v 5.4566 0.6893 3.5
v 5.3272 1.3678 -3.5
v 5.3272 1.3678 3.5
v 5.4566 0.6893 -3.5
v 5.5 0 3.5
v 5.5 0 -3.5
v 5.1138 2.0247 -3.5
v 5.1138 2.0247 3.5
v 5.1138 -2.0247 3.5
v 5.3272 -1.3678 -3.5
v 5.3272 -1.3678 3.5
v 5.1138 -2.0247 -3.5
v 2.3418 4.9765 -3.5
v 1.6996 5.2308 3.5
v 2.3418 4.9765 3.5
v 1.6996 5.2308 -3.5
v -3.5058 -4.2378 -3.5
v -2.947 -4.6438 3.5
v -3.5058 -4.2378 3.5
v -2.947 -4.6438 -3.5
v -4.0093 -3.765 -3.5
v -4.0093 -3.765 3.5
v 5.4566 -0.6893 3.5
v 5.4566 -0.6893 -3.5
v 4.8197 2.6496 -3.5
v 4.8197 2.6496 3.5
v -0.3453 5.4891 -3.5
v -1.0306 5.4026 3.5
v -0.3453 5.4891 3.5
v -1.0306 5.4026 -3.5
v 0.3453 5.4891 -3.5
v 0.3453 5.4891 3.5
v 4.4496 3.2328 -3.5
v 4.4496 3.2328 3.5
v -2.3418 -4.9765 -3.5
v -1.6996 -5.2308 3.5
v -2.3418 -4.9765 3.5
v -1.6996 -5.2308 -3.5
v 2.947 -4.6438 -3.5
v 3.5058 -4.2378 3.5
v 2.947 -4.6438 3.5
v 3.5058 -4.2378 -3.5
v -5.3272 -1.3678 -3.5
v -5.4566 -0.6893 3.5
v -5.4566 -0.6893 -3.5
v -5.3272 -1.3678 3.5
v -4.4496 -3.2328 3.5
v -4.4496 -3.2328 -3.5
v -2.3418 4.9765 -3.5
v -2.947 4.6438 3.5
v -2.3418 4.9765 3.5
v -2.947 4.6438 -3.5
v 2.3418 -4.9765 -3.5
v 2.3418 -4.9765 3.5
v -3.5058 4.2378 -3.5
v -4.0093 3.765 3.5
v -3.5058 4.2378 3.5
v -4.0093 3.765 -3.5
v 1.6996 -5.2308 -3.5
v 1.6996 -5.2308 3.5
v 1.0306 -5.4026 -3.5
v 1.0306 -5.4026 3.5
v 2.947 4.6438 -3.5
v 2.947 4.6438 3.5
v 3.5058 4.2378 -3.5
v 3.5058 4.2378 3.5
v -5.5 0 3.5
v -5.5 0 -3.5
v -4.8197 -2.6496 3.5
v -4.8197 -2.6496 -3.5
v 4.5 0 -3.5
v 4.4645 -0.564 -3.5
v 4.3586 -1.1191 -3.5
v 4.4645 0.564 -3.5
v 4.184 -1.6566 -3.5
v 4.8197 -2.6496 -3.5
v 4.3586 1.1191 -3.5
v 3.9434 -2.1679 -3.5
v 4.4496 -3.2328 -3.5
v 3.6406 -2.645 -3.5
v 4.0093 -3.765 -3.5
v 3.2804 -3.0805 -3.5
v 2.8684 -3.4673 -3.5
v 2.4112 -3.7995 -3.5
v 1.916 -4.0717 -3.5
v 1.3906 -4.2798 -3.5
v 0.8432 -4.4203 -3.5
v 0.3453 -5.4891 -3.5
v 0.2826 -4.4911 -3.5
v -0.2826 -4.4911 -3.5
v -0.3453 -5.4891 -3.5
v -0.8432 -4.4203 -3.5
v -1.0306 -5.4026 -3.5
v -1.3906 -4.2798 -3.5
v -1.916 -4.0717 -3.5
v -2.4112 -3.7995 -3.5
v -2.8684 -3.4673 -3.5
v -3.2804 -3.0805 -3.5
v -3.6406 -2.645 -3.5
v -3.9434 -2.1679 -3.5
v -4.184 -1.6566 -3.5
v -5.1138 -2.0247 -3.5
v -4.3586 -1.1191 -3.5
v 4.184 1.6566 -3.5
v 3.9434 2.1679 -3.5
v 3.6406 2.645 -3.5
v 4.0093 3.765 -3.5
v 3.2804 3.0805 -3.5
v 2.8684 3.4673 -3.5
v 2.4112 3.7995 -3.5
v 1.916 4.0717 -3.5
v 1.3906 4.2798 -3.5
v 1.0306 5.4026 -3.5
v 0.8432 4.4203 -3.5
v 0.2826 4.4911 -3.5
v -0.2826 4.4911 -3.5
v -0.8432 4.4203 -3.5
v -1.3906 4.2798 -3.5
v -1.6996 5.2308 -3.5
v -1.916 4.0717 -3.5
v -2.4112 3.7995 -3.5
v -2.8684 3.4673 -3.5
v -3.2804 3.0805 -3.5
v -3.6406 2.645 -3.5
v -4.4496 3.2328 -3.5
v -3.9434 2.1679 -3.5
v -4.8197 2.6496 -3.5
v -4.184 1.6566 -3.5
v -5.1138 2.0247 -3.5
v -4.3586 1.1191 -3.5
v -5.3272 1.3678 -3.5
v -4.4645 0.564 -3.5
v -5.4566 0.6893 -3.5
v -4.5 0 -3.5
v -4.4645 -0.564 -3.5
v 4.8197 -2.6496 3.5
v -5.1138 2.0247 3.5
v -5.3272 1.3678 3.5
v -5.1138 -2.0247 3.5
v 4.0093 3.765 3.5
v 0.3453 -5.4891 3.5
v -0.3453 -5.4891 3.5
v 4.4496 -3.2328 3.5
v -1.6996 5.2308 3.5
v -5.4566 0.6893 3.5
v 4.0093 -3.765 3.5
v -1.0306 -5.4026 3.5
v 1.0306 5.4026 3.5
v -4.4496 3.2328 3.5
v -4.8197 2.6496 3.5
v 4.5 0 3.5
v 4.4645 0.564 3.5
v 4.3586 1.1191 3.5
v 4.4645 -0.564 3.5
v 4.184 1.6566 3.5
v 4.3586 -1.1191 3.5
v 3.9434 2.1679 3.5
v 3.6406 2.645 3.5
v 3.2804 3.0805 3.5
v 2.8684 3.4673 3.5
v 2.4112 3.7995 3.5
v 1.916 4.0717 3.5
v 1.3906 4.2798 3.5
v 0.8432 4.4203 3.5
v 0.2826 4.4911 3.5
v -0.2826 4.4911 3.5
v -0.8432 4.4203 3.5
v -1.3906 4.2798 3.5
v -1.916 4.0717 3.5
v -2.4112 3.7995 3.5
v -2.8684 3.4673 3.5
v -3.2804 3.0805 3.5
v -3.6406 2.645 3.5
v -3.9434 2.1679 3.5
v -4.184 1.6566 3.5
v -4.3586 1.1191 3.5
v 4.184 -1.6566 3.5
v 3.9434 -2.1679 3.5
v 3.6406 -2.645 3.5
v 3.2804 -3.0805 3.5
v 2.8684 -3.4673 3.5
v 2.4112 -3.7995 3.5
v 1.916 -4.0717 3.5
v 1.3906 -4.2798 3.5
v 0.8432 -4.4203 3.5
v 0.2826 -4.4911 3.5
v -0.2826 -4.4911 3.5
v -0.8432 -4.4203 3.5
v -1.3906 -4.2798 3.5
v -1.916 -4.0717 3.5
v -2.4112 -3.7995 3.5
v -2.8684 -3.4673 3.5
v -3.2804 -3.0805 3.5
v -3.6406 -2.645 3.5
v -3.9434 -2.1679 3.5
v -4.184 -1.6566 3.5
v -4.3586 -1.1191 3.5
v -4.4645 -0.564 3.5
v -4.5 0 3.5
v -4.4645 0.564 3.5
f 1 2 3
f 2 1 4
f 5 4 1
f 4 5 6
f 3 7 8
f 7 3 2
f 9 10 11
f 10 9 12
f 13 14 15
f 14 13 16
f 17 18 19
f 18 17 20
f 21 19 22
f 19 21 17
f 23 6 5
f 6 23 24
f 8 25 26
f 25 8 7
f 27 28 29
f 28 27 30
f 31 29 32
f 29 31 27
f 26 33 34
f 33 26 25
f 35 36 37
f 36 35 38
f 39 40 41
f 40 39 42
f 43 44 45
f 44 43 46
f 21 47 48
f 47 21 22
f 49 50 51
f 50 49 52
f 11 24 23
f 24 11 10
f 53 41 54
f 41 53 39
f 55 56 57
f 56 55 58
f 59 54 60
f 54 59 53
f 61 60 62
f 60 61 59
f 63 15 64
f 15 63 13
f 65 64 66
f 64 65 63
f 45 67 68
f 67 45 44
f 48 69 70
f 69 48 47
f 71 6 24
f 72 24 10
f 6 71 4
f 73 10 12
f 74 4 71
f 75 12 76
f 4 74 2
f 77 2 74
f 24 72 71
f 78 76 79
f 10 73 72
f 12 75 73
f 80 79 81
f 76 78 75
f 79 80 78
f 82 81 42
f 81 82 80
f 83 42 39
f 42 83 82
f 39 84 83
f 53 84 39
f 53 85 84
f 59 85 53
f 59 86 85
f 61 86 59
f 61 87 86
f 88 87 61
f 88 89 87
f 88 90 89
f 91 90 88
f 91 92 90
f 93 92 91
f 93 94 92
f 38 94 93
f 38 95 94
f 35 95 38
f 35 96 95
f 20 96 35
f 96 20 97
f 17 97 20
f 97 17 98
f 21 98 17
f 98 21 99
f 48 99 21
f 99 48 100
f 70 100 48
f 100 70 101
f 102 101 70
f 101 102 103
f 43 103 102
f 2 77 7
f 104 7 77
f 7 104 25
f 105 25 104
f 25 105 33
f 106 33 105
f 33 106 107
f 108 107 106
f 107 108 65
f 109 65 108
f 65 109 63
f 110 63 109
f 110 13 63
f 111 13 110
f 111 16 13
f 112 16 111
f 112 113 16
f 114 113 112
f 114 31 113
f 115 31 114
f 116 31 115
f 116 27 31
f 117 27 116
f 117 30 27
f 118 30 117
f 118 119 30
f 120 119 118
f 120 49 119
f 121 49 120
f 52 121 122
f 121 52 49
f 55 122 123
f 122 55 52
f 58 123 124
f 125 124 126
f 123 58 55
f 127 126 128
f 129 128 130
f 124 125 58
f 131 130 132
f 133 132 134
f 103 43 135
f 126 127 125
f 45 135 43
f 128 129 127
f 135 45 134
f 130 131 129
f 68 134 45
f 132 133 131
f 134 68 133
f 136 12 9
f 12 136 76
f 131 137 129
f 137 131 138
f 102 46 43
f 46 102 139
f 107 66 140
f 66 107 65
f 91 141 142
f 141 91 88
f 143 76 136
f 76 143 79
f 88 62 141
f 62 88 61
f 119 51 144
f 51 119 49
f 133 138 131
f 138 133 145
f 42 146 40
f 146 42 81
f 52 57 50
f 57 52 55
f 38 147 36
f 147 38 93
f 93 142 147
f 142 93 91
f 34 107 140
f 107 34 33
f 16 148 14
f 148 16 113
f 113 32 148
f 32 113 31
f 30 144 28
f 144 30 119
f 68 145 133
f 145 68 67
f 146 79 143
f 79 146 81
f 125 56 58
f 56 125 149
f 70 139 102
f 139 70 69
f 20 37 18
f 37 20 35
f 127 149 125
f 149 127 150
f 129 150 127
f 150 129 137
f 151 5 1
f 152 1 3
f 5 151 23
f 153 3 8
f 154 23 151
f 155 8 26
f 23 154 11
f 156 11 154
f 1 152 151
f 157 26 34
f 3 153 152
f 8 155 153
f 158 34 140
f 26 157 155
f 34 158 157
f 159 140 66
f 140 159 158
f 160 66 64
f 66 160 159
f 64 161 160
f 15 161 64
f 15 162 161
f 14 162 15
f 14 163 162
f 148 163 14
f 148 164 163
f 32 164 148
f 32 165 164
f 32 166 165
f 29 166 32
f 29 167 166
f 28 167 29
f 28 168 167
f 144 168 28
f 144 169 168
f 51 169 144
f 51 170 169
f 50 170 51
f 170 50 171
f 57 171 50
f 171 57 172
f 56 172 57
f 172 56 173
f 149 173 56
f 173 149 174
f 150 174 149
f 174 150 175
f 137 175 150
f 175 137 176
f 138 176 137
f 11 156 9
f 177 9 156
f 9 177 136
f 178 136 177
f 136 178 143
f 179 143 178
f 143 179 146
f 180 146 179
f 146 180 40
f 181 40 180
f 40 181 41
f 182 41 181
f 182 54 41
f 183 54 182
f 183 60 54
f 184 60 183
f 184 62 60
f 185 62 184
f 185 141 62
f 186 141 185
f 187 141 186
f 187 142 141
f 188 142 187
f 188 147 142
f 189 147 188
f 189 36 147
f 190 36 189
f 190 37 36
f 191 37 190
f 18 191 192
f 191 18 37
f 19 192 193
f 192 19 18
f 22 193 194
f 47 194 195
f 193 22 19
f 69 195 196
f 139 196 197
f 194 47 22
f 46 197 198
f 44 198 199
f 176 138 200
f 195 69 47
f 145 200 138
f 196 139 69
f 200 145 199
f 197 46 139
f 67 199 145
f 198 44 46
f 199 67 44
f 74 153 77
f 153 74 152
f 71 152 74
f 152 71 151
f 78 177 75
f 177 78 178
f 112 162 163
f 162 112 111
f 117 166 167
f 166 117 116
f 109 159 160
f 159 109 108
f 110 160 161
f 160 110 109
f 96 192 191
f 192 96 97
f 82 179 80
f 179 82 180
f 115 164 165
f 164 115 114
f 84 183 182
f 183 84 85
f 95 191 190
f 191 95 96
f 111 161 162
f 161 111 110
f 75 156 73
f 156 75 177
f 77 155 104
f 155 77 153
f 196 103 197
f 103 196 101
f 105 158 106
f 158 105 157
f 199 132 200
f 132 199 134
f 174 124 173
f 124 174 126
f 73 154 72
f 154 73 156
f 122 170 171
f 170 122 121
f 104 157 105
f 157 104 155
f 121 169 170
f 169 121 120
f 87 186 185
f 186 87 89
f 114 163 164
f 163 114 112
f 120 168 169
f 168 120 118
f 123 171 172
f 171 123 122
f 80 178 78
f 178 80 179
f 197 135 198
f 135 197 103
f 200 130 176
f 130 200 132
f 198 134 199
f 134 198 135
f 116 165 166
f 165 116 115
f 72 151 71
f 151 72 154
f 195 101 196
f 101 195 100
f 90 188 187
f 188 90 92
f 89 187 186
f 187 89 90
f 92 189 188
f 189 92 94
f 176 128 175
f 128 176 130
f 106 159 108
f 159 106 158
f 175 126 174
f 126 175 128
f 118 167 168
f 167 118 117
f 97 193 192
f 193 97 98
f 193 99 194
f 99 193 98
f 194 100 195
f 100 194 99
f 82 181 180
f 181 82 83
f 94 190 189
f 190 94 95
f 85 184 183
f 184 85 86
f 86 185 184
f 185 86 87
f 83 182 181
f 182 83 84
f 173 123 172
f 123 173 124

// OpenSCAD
$fn = 50;


difference() {
	union() {
		translate(v = [0, 0, -3.5000000000]) {
			cylinder(h = 7, r = 5.5000000000);
		}
	}
	union() {
		translate(v = [0, 0, -100.0000000000]) {
			cylinder(h = 200, r = 4.5000000000);
		}
	}
}
